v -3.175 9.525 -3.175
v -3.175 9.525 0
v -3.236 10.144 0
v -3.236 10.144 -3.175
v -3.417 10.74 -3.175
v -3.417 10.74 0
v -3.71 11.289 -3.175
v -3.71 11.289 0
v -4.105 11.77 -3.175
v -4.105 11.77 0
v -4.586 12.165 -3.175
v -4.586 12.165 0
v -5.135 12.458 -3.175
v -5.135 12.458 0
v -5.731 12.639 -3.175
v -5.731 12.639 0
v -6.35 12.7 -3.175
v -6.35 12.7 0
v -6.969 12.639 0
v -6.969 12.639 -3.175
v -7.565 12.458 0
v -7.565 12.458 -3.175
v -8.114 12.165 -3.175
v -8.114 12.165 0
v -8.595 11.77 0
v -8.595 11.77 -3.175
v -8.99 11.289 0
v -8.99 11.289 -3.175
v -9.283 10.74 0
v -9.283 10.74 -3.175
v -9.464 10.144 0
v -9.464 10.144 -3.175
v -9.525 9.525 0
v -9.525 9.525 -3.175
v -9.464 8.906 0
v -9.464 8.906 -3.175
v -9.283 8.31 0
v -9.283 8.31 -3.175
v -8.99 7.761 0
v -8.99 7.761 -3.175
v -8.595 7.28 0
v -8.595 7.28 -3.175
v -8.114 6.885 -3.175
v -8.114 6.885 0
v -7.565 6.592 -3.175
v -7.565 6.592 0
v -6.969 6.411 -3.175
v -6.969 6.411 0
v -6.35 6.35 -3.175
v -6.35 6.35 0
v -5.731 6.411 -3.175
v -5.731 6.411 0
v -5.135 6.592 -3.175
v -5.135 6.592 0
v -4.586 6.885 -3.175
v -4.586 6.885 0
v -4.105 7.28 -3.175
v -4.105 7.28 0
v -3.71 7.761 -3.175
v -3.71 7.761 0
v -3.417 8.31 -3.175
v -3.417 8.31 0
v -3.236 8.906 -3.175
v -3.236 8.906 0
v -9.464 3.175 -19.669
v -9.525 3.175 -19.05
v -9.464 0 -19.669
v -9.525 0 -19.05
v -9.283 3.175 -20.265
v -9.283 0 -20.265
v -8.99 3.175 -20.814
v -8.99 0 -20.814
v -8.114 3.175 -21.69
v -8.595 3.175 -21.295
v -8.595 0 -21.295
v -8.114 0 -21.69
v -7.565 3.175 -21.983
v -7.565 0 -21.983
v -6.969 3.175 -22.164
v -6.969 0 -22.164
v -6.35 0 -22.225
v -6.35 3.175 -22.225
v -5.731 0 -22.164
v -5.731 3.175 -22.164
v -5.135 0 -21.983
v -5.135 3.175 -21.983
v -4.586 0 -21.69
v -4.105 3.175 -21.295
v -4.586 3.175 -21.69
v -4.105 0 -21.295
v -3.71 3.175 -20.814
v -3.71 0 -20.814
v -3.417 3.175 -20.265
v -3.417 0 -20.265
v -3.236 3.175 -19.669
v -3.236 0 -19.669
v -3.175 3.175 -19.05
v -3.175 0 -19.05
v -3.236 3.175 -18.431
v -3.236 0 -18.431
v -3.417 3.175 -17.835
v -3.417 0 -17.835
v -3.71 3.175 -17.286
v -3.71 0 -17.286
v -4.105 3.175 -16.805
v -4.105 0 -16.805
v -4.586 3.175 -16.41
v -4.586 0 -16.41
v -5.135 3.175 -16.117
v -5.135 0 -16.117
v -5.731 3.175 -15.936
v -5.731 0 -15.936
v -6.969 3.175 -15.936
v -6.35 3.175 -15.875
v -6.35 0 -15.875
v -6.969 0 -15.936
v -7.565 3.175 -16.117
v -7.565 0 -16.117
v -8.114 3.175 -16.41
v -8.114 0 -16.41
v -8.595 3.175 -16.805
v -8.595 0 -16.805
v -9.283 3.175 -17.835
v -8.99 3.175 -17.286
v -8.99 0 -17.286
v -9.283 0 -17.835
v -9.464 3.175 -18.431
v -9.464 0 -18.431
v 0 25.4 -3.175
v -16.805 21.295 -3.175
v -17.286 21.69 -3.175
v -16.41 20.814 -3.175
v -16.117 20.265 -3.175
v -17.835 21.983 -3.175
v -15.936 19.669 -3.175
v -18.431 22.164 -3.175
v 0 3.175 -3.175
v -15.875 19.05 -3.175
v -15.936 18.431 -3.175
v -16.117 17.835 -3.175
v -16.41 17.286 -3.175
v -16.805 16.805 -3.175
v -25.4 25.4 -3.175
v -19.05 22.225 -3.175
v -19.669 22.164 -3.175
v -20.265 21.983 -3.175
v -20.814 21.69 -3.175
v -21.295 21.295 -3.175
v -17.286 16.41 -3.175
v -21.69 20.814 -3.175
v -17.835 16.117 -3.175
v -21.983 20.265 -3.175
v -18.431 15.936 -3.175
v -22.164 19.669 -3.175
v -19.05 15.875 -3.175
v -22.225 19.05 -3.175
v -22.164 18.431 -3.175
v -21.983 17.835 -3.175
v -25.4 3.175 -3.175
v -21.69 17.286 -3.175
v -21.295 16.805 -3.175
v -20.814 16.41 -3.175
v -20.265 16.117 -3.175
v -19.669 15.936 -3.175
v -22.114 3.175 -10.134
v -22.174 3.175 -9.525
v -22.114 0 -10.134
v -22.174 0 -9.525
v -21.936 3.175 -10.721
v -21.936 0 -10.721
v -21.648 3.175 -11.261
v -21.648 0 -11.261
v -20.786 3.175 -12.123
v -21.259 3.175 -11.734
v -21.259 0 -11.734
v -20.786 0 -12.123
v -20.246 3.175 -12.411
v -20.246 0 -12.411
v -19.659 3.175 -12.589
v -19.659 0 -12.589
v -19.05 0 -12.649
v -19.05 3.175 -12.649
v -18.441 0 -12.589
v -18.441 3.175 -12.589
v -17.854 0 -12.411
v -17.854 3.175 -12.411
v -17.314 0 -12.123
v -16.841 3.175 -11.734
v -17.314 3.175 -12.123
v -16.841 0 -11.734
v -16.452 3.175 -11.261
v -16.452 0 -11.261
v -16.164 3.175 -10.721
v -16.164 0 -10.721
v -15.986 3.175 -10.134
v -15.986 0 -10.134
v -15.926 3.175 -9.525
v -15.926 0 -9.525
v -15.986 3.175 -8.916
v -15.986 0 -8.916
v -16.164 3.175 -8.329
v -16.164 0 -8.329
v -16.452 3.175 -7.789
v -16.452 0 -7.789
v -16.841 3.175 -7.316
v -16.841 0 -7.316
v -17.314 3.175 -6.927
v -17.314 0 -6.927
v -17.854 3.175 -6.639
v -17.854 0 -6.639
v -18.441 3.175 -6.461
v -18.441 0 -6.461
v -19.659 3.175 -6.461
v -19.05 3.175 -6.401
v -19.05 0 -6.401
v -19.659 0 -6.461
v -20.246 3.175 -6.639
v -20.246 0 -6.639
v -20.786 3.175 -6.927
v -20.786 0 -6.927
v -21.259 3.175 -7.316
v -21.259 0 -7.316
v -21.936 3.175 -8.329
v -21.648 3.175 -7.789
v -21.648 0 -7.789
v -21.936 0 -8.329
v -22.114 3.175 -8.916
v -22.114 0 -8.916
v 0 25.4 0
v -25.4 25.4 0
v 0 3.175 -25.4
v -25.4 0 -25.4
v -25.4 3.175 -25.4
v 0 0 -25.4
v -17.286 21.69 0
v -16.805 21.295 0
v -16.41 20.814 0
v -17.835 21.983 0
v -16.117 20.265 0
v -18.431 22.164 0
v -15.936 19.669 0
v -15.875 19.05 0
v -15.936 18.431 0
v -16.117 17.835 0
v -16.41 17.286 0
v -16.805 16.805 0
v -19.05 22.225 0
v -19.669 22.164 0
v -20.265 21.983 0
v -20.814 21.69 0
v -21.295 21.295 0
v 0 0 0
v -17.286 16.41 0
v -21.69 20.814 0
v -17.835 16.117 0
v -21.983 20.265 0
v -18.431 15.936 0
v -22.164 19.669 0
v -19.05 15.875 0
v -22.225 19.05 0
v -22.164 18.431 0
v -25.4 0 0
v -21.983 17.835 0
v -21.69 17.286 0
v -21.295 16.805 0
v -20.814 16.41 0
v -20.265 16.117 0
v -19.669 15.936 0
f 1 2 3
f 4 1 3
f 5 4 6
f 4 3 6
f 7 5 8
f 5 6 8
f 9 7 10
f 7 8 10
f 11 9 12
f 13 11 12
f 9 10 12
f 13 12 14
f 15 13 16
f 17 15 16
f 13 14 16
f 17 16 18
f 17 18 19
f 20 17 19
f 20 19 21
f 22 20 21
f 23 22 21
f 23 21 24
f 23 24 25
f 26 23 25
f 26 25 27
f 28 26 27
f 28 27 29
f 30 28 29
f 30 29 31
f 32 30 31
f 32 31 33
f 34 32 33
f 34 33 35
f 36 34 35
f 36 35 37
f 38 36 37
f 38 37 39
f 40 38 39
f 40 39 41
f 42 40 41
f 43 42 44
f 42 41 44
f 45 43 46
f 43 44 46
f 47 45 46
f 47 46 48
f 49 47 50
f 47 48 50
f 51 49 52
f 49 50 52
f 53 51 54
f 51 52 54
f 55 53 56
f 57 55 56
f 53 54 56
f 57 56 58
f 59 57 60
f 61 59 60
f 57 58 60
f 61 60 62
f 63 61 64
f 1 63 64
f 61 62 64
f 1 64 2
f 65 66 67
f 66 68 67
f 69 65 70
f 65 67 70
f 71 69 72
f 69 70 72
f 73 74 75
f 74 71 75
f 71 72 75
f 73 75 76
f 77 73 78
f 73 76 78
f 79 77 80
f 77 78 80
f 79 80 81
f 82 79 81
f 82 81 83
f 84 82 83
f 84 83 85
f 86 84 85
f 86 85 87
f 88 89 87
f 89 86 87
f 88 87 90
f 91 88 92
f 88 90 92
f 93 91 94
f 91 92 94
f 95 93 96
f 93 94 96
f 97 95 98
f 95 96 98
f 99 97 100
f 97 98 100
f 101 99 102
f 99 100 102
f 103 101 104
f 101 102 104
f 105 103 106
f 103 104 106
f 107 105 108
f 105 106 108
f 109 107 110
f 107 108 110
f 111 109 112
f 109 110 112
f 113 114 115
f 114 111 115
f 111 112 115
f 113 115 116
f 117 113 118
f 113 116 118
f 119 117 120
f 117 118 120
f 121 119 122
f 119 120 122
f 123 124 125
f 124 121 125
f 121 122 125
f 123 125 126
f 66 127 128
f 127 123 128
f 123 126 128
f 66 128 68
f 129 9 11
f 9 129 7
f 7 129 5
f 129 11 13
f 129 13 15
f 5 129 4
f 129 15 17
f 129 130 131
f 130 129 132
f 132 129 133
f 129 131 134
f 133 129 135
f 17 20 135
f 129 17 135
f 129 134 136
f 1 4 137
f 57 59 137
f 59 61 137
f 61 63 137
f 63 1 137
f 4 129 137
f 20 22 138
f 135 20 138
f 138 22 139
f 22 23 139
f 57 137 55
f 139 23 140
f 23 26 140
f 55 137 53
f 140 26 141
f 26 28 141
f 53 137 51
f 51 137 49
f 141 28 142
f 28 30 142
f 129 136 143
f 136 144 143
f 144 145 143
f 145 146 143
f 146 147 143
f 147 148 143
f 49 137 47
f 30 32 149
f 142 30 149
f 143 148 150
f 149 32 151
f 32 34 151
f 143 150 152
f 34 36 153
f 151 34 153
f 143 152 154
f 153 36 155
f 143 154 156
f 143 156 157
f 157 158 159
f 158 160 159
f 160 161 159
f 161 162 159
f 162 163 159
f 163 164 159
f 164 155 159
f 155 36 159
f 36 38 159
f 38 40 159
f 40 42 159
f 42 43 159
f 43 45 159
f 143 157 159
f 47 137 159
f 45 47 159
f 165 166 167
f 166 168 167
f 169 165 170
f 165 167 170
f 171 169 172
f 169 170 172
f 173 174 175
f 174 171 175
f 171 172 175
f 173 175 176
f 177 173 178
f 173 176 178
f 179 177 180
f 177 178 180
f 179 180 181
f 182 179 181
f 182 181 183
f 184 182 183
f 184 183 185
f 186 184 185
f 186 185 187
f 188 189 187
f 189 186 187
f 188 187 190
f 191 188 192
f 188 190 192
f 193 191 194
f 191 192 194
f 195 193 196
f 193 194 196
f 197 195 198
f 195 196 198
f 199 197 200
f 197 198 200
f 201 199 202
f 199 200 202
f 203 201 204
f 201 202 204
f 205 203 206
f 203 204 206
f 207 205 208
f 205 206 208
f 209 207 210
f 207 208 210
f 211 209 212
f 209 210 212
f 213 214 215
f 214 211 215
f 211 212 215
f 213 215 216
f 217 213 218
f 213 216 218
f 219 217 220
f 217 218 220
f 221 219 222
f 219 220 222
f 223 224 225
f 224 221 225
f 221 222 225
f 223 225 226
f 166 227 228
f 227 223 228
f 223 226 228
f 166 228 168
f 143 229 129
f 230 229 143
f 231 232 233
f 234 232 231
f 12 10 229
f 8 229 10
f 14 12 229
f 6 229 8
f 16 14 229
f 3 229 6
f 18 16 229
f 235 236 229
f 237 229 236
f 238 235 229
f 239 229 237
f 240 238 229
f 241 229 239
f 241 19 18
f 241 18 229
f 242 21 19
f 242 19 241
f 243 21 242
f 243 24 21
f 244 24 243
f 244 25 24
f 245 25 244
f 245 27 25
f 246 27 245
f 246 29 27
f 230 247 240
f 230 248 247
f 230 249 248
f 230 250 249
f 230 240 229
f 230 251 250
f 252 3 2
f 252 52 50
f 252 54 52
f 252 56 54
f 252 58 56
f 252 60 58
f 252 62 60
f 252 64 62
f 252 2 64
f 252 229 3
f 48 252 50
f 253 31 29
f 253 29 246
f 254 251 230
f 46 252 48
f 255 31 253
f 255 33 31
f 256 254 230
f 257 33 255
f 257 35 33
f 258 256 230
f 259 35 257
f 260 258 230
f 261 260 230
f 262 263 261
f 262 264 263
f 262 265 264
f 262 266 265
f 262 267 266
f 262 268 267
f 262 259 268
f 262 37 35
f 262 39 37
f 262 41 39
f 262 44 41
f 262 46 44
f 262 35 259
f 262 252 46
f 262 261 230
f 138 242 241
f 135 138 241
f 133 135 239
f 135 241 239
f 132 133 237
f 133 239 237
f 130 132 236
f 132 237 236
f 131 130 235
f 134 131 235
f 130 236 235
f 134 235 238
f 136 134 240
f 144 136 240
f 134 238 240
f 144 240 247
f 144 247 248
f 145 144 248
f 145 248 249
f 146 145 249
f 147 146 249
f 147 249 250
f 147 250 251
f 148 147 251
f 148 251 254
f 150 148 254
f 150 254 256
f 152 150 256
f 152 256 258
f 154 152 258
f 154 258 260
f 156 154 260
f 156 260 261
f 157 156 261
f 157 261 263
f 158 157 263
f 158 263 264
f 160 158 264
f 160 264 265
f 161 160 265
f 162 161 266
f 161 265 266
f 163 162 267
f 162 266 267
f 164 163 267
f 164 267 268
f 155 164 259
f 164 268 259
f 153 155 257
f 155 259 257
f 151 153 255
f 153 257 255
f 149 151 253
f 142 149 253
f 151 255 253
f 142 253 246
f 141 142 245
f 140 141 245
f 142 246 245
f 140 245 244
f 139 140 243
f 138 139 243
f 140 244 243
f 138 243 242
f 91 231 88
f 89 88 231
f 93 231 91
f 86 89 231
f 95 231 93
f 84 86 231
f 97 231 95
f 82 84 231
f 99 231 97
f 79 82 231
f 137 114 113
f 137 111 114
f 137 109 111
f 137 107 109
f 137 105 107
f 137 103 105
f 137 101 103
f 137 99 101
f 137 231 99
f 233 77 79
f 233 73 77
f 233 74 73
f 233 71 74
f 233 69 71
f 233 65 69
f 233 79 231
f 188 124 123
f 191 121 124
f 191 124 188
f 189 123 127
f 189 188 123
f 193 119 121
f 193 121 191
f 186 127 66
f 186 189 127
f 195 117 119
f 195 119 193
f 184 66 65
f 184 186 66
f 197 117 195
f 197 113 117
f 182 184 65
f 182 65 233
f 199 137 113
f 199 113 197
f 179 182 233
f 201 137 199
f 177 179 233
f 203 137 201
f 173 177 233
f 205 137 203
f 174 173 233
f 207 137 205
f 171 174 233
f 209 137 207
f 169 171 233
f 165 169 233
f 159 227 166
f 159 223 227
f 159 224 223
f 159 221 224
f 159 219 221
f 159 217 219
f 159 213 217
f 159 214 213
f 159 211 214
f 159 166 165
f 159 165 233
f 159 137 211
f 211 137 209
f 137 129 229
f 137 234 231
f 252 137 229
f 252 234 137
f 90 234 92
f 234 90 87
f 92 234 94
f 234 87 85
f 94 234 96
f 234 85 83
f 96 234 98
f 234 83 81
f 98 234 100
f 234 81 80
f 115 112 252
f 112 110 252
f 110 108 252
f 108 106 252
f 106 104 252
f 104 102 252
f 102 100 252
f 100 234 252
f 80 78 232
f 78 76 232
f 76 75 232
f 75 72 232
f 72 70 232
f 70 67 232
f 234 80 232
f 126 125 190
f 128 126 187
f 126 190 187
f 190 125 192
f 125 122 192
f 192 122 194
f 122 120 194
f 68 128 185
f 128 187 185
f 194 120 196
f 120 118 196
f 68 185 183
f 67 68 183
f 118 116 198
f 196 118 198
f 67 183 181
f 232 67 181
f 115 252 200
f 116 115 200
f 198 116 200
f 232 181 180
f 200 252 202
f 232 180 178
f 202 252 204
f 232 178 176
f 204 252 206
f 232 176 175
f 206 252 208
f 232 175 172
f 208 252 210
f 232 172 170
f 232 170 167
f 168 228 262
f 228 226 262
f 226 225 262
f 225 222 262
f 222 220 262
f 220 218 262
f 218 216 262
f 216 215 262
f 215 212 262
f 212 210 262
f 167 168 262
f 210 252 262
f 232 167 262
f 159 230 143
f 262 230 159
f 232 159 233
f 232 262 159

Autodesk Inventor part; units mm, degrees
ref_plane "YZ Plane" through (0, 0, 0) normal (1, 0, 0) x (0, 1, 0)
ref_plane "XZ Plane" through (0, 0, 0) normal (0, 1, 0) x (-1, 0, 0)
ref_plane "XY Plane" through (0, 0, 0) normal (0, 0, 1) x (1, 0, 0)
sketch "Sketch1" plane through (0, 0, 0) normal (0, 1, 0) x (-1, 0, 0)
  line L0 (0, 0) -> (25.4, 0)
  line L1 (25.4, 0) -> (25.4, -25.4)
  line L2 (25.4, -25.4) -> (0, -25.4)
  line L3 (0, -25.4) -> (0, 0)
  circle A0 centre (6.35, -19.05) radius 3.175
  circle A1 centre (19.05, -9.525) radius 3.124
  line L4 (25.4, 0) -> (0, 0)
  line L5 (0, 0) -> (0, -3.175)
  line L6 (0, -3.175) -> (25.4, -3.175)
  line L7 (25.4, -3.175) -> (25.4, 0)
  dimension "d0" = 25.4
  dimension "d1" = 25.4
  dimension "d2" = 6.35
  dimension "d3" = 6.35
  dimension "d4" = 6.35
  dimension "d5" = 9.525
  dimension "d6" = 6.35
  dimension "d7" = 3.175
extrude "Extrusion1" add sketch "Sketch1" along normal blind 3.175 contours L6 L1 L2 L3
extrude "Extrusion2" add sketch "Sketch1" along normal blind 25.4 contours L0 L1 L6 L3
sketch "Sketch2" plane through (-25.4, 0, 0) normal (0, 0, 1) x (1, 0, 0)
  circle A0 centre (6.35, 19.05) radius 3.175
  line L0 (0, 25.4) -> (25.4, 25.4) projected
  line L1 (0, 0) -> (0, 25.4) projected
  circle A1 centre (19.05, 9.525) radius 3.175
  line L2 (25.4, 0) -> (25.4, 25.4) projected
  line L3 (0, 0) -> (25.4, 0) projected
  dimension "d12" = 6.35
  dimension "d13" = 6.35
  dimension "d14" = 6.35
  dimension "d15" = 6.35
  dimension "d16" = 9.525
  dimension "d17" = 6.35
extrude "Extrusion3" cut sketch "Sketch2" against normal through all contours A0 | A1
properties part number "connector1by1"
